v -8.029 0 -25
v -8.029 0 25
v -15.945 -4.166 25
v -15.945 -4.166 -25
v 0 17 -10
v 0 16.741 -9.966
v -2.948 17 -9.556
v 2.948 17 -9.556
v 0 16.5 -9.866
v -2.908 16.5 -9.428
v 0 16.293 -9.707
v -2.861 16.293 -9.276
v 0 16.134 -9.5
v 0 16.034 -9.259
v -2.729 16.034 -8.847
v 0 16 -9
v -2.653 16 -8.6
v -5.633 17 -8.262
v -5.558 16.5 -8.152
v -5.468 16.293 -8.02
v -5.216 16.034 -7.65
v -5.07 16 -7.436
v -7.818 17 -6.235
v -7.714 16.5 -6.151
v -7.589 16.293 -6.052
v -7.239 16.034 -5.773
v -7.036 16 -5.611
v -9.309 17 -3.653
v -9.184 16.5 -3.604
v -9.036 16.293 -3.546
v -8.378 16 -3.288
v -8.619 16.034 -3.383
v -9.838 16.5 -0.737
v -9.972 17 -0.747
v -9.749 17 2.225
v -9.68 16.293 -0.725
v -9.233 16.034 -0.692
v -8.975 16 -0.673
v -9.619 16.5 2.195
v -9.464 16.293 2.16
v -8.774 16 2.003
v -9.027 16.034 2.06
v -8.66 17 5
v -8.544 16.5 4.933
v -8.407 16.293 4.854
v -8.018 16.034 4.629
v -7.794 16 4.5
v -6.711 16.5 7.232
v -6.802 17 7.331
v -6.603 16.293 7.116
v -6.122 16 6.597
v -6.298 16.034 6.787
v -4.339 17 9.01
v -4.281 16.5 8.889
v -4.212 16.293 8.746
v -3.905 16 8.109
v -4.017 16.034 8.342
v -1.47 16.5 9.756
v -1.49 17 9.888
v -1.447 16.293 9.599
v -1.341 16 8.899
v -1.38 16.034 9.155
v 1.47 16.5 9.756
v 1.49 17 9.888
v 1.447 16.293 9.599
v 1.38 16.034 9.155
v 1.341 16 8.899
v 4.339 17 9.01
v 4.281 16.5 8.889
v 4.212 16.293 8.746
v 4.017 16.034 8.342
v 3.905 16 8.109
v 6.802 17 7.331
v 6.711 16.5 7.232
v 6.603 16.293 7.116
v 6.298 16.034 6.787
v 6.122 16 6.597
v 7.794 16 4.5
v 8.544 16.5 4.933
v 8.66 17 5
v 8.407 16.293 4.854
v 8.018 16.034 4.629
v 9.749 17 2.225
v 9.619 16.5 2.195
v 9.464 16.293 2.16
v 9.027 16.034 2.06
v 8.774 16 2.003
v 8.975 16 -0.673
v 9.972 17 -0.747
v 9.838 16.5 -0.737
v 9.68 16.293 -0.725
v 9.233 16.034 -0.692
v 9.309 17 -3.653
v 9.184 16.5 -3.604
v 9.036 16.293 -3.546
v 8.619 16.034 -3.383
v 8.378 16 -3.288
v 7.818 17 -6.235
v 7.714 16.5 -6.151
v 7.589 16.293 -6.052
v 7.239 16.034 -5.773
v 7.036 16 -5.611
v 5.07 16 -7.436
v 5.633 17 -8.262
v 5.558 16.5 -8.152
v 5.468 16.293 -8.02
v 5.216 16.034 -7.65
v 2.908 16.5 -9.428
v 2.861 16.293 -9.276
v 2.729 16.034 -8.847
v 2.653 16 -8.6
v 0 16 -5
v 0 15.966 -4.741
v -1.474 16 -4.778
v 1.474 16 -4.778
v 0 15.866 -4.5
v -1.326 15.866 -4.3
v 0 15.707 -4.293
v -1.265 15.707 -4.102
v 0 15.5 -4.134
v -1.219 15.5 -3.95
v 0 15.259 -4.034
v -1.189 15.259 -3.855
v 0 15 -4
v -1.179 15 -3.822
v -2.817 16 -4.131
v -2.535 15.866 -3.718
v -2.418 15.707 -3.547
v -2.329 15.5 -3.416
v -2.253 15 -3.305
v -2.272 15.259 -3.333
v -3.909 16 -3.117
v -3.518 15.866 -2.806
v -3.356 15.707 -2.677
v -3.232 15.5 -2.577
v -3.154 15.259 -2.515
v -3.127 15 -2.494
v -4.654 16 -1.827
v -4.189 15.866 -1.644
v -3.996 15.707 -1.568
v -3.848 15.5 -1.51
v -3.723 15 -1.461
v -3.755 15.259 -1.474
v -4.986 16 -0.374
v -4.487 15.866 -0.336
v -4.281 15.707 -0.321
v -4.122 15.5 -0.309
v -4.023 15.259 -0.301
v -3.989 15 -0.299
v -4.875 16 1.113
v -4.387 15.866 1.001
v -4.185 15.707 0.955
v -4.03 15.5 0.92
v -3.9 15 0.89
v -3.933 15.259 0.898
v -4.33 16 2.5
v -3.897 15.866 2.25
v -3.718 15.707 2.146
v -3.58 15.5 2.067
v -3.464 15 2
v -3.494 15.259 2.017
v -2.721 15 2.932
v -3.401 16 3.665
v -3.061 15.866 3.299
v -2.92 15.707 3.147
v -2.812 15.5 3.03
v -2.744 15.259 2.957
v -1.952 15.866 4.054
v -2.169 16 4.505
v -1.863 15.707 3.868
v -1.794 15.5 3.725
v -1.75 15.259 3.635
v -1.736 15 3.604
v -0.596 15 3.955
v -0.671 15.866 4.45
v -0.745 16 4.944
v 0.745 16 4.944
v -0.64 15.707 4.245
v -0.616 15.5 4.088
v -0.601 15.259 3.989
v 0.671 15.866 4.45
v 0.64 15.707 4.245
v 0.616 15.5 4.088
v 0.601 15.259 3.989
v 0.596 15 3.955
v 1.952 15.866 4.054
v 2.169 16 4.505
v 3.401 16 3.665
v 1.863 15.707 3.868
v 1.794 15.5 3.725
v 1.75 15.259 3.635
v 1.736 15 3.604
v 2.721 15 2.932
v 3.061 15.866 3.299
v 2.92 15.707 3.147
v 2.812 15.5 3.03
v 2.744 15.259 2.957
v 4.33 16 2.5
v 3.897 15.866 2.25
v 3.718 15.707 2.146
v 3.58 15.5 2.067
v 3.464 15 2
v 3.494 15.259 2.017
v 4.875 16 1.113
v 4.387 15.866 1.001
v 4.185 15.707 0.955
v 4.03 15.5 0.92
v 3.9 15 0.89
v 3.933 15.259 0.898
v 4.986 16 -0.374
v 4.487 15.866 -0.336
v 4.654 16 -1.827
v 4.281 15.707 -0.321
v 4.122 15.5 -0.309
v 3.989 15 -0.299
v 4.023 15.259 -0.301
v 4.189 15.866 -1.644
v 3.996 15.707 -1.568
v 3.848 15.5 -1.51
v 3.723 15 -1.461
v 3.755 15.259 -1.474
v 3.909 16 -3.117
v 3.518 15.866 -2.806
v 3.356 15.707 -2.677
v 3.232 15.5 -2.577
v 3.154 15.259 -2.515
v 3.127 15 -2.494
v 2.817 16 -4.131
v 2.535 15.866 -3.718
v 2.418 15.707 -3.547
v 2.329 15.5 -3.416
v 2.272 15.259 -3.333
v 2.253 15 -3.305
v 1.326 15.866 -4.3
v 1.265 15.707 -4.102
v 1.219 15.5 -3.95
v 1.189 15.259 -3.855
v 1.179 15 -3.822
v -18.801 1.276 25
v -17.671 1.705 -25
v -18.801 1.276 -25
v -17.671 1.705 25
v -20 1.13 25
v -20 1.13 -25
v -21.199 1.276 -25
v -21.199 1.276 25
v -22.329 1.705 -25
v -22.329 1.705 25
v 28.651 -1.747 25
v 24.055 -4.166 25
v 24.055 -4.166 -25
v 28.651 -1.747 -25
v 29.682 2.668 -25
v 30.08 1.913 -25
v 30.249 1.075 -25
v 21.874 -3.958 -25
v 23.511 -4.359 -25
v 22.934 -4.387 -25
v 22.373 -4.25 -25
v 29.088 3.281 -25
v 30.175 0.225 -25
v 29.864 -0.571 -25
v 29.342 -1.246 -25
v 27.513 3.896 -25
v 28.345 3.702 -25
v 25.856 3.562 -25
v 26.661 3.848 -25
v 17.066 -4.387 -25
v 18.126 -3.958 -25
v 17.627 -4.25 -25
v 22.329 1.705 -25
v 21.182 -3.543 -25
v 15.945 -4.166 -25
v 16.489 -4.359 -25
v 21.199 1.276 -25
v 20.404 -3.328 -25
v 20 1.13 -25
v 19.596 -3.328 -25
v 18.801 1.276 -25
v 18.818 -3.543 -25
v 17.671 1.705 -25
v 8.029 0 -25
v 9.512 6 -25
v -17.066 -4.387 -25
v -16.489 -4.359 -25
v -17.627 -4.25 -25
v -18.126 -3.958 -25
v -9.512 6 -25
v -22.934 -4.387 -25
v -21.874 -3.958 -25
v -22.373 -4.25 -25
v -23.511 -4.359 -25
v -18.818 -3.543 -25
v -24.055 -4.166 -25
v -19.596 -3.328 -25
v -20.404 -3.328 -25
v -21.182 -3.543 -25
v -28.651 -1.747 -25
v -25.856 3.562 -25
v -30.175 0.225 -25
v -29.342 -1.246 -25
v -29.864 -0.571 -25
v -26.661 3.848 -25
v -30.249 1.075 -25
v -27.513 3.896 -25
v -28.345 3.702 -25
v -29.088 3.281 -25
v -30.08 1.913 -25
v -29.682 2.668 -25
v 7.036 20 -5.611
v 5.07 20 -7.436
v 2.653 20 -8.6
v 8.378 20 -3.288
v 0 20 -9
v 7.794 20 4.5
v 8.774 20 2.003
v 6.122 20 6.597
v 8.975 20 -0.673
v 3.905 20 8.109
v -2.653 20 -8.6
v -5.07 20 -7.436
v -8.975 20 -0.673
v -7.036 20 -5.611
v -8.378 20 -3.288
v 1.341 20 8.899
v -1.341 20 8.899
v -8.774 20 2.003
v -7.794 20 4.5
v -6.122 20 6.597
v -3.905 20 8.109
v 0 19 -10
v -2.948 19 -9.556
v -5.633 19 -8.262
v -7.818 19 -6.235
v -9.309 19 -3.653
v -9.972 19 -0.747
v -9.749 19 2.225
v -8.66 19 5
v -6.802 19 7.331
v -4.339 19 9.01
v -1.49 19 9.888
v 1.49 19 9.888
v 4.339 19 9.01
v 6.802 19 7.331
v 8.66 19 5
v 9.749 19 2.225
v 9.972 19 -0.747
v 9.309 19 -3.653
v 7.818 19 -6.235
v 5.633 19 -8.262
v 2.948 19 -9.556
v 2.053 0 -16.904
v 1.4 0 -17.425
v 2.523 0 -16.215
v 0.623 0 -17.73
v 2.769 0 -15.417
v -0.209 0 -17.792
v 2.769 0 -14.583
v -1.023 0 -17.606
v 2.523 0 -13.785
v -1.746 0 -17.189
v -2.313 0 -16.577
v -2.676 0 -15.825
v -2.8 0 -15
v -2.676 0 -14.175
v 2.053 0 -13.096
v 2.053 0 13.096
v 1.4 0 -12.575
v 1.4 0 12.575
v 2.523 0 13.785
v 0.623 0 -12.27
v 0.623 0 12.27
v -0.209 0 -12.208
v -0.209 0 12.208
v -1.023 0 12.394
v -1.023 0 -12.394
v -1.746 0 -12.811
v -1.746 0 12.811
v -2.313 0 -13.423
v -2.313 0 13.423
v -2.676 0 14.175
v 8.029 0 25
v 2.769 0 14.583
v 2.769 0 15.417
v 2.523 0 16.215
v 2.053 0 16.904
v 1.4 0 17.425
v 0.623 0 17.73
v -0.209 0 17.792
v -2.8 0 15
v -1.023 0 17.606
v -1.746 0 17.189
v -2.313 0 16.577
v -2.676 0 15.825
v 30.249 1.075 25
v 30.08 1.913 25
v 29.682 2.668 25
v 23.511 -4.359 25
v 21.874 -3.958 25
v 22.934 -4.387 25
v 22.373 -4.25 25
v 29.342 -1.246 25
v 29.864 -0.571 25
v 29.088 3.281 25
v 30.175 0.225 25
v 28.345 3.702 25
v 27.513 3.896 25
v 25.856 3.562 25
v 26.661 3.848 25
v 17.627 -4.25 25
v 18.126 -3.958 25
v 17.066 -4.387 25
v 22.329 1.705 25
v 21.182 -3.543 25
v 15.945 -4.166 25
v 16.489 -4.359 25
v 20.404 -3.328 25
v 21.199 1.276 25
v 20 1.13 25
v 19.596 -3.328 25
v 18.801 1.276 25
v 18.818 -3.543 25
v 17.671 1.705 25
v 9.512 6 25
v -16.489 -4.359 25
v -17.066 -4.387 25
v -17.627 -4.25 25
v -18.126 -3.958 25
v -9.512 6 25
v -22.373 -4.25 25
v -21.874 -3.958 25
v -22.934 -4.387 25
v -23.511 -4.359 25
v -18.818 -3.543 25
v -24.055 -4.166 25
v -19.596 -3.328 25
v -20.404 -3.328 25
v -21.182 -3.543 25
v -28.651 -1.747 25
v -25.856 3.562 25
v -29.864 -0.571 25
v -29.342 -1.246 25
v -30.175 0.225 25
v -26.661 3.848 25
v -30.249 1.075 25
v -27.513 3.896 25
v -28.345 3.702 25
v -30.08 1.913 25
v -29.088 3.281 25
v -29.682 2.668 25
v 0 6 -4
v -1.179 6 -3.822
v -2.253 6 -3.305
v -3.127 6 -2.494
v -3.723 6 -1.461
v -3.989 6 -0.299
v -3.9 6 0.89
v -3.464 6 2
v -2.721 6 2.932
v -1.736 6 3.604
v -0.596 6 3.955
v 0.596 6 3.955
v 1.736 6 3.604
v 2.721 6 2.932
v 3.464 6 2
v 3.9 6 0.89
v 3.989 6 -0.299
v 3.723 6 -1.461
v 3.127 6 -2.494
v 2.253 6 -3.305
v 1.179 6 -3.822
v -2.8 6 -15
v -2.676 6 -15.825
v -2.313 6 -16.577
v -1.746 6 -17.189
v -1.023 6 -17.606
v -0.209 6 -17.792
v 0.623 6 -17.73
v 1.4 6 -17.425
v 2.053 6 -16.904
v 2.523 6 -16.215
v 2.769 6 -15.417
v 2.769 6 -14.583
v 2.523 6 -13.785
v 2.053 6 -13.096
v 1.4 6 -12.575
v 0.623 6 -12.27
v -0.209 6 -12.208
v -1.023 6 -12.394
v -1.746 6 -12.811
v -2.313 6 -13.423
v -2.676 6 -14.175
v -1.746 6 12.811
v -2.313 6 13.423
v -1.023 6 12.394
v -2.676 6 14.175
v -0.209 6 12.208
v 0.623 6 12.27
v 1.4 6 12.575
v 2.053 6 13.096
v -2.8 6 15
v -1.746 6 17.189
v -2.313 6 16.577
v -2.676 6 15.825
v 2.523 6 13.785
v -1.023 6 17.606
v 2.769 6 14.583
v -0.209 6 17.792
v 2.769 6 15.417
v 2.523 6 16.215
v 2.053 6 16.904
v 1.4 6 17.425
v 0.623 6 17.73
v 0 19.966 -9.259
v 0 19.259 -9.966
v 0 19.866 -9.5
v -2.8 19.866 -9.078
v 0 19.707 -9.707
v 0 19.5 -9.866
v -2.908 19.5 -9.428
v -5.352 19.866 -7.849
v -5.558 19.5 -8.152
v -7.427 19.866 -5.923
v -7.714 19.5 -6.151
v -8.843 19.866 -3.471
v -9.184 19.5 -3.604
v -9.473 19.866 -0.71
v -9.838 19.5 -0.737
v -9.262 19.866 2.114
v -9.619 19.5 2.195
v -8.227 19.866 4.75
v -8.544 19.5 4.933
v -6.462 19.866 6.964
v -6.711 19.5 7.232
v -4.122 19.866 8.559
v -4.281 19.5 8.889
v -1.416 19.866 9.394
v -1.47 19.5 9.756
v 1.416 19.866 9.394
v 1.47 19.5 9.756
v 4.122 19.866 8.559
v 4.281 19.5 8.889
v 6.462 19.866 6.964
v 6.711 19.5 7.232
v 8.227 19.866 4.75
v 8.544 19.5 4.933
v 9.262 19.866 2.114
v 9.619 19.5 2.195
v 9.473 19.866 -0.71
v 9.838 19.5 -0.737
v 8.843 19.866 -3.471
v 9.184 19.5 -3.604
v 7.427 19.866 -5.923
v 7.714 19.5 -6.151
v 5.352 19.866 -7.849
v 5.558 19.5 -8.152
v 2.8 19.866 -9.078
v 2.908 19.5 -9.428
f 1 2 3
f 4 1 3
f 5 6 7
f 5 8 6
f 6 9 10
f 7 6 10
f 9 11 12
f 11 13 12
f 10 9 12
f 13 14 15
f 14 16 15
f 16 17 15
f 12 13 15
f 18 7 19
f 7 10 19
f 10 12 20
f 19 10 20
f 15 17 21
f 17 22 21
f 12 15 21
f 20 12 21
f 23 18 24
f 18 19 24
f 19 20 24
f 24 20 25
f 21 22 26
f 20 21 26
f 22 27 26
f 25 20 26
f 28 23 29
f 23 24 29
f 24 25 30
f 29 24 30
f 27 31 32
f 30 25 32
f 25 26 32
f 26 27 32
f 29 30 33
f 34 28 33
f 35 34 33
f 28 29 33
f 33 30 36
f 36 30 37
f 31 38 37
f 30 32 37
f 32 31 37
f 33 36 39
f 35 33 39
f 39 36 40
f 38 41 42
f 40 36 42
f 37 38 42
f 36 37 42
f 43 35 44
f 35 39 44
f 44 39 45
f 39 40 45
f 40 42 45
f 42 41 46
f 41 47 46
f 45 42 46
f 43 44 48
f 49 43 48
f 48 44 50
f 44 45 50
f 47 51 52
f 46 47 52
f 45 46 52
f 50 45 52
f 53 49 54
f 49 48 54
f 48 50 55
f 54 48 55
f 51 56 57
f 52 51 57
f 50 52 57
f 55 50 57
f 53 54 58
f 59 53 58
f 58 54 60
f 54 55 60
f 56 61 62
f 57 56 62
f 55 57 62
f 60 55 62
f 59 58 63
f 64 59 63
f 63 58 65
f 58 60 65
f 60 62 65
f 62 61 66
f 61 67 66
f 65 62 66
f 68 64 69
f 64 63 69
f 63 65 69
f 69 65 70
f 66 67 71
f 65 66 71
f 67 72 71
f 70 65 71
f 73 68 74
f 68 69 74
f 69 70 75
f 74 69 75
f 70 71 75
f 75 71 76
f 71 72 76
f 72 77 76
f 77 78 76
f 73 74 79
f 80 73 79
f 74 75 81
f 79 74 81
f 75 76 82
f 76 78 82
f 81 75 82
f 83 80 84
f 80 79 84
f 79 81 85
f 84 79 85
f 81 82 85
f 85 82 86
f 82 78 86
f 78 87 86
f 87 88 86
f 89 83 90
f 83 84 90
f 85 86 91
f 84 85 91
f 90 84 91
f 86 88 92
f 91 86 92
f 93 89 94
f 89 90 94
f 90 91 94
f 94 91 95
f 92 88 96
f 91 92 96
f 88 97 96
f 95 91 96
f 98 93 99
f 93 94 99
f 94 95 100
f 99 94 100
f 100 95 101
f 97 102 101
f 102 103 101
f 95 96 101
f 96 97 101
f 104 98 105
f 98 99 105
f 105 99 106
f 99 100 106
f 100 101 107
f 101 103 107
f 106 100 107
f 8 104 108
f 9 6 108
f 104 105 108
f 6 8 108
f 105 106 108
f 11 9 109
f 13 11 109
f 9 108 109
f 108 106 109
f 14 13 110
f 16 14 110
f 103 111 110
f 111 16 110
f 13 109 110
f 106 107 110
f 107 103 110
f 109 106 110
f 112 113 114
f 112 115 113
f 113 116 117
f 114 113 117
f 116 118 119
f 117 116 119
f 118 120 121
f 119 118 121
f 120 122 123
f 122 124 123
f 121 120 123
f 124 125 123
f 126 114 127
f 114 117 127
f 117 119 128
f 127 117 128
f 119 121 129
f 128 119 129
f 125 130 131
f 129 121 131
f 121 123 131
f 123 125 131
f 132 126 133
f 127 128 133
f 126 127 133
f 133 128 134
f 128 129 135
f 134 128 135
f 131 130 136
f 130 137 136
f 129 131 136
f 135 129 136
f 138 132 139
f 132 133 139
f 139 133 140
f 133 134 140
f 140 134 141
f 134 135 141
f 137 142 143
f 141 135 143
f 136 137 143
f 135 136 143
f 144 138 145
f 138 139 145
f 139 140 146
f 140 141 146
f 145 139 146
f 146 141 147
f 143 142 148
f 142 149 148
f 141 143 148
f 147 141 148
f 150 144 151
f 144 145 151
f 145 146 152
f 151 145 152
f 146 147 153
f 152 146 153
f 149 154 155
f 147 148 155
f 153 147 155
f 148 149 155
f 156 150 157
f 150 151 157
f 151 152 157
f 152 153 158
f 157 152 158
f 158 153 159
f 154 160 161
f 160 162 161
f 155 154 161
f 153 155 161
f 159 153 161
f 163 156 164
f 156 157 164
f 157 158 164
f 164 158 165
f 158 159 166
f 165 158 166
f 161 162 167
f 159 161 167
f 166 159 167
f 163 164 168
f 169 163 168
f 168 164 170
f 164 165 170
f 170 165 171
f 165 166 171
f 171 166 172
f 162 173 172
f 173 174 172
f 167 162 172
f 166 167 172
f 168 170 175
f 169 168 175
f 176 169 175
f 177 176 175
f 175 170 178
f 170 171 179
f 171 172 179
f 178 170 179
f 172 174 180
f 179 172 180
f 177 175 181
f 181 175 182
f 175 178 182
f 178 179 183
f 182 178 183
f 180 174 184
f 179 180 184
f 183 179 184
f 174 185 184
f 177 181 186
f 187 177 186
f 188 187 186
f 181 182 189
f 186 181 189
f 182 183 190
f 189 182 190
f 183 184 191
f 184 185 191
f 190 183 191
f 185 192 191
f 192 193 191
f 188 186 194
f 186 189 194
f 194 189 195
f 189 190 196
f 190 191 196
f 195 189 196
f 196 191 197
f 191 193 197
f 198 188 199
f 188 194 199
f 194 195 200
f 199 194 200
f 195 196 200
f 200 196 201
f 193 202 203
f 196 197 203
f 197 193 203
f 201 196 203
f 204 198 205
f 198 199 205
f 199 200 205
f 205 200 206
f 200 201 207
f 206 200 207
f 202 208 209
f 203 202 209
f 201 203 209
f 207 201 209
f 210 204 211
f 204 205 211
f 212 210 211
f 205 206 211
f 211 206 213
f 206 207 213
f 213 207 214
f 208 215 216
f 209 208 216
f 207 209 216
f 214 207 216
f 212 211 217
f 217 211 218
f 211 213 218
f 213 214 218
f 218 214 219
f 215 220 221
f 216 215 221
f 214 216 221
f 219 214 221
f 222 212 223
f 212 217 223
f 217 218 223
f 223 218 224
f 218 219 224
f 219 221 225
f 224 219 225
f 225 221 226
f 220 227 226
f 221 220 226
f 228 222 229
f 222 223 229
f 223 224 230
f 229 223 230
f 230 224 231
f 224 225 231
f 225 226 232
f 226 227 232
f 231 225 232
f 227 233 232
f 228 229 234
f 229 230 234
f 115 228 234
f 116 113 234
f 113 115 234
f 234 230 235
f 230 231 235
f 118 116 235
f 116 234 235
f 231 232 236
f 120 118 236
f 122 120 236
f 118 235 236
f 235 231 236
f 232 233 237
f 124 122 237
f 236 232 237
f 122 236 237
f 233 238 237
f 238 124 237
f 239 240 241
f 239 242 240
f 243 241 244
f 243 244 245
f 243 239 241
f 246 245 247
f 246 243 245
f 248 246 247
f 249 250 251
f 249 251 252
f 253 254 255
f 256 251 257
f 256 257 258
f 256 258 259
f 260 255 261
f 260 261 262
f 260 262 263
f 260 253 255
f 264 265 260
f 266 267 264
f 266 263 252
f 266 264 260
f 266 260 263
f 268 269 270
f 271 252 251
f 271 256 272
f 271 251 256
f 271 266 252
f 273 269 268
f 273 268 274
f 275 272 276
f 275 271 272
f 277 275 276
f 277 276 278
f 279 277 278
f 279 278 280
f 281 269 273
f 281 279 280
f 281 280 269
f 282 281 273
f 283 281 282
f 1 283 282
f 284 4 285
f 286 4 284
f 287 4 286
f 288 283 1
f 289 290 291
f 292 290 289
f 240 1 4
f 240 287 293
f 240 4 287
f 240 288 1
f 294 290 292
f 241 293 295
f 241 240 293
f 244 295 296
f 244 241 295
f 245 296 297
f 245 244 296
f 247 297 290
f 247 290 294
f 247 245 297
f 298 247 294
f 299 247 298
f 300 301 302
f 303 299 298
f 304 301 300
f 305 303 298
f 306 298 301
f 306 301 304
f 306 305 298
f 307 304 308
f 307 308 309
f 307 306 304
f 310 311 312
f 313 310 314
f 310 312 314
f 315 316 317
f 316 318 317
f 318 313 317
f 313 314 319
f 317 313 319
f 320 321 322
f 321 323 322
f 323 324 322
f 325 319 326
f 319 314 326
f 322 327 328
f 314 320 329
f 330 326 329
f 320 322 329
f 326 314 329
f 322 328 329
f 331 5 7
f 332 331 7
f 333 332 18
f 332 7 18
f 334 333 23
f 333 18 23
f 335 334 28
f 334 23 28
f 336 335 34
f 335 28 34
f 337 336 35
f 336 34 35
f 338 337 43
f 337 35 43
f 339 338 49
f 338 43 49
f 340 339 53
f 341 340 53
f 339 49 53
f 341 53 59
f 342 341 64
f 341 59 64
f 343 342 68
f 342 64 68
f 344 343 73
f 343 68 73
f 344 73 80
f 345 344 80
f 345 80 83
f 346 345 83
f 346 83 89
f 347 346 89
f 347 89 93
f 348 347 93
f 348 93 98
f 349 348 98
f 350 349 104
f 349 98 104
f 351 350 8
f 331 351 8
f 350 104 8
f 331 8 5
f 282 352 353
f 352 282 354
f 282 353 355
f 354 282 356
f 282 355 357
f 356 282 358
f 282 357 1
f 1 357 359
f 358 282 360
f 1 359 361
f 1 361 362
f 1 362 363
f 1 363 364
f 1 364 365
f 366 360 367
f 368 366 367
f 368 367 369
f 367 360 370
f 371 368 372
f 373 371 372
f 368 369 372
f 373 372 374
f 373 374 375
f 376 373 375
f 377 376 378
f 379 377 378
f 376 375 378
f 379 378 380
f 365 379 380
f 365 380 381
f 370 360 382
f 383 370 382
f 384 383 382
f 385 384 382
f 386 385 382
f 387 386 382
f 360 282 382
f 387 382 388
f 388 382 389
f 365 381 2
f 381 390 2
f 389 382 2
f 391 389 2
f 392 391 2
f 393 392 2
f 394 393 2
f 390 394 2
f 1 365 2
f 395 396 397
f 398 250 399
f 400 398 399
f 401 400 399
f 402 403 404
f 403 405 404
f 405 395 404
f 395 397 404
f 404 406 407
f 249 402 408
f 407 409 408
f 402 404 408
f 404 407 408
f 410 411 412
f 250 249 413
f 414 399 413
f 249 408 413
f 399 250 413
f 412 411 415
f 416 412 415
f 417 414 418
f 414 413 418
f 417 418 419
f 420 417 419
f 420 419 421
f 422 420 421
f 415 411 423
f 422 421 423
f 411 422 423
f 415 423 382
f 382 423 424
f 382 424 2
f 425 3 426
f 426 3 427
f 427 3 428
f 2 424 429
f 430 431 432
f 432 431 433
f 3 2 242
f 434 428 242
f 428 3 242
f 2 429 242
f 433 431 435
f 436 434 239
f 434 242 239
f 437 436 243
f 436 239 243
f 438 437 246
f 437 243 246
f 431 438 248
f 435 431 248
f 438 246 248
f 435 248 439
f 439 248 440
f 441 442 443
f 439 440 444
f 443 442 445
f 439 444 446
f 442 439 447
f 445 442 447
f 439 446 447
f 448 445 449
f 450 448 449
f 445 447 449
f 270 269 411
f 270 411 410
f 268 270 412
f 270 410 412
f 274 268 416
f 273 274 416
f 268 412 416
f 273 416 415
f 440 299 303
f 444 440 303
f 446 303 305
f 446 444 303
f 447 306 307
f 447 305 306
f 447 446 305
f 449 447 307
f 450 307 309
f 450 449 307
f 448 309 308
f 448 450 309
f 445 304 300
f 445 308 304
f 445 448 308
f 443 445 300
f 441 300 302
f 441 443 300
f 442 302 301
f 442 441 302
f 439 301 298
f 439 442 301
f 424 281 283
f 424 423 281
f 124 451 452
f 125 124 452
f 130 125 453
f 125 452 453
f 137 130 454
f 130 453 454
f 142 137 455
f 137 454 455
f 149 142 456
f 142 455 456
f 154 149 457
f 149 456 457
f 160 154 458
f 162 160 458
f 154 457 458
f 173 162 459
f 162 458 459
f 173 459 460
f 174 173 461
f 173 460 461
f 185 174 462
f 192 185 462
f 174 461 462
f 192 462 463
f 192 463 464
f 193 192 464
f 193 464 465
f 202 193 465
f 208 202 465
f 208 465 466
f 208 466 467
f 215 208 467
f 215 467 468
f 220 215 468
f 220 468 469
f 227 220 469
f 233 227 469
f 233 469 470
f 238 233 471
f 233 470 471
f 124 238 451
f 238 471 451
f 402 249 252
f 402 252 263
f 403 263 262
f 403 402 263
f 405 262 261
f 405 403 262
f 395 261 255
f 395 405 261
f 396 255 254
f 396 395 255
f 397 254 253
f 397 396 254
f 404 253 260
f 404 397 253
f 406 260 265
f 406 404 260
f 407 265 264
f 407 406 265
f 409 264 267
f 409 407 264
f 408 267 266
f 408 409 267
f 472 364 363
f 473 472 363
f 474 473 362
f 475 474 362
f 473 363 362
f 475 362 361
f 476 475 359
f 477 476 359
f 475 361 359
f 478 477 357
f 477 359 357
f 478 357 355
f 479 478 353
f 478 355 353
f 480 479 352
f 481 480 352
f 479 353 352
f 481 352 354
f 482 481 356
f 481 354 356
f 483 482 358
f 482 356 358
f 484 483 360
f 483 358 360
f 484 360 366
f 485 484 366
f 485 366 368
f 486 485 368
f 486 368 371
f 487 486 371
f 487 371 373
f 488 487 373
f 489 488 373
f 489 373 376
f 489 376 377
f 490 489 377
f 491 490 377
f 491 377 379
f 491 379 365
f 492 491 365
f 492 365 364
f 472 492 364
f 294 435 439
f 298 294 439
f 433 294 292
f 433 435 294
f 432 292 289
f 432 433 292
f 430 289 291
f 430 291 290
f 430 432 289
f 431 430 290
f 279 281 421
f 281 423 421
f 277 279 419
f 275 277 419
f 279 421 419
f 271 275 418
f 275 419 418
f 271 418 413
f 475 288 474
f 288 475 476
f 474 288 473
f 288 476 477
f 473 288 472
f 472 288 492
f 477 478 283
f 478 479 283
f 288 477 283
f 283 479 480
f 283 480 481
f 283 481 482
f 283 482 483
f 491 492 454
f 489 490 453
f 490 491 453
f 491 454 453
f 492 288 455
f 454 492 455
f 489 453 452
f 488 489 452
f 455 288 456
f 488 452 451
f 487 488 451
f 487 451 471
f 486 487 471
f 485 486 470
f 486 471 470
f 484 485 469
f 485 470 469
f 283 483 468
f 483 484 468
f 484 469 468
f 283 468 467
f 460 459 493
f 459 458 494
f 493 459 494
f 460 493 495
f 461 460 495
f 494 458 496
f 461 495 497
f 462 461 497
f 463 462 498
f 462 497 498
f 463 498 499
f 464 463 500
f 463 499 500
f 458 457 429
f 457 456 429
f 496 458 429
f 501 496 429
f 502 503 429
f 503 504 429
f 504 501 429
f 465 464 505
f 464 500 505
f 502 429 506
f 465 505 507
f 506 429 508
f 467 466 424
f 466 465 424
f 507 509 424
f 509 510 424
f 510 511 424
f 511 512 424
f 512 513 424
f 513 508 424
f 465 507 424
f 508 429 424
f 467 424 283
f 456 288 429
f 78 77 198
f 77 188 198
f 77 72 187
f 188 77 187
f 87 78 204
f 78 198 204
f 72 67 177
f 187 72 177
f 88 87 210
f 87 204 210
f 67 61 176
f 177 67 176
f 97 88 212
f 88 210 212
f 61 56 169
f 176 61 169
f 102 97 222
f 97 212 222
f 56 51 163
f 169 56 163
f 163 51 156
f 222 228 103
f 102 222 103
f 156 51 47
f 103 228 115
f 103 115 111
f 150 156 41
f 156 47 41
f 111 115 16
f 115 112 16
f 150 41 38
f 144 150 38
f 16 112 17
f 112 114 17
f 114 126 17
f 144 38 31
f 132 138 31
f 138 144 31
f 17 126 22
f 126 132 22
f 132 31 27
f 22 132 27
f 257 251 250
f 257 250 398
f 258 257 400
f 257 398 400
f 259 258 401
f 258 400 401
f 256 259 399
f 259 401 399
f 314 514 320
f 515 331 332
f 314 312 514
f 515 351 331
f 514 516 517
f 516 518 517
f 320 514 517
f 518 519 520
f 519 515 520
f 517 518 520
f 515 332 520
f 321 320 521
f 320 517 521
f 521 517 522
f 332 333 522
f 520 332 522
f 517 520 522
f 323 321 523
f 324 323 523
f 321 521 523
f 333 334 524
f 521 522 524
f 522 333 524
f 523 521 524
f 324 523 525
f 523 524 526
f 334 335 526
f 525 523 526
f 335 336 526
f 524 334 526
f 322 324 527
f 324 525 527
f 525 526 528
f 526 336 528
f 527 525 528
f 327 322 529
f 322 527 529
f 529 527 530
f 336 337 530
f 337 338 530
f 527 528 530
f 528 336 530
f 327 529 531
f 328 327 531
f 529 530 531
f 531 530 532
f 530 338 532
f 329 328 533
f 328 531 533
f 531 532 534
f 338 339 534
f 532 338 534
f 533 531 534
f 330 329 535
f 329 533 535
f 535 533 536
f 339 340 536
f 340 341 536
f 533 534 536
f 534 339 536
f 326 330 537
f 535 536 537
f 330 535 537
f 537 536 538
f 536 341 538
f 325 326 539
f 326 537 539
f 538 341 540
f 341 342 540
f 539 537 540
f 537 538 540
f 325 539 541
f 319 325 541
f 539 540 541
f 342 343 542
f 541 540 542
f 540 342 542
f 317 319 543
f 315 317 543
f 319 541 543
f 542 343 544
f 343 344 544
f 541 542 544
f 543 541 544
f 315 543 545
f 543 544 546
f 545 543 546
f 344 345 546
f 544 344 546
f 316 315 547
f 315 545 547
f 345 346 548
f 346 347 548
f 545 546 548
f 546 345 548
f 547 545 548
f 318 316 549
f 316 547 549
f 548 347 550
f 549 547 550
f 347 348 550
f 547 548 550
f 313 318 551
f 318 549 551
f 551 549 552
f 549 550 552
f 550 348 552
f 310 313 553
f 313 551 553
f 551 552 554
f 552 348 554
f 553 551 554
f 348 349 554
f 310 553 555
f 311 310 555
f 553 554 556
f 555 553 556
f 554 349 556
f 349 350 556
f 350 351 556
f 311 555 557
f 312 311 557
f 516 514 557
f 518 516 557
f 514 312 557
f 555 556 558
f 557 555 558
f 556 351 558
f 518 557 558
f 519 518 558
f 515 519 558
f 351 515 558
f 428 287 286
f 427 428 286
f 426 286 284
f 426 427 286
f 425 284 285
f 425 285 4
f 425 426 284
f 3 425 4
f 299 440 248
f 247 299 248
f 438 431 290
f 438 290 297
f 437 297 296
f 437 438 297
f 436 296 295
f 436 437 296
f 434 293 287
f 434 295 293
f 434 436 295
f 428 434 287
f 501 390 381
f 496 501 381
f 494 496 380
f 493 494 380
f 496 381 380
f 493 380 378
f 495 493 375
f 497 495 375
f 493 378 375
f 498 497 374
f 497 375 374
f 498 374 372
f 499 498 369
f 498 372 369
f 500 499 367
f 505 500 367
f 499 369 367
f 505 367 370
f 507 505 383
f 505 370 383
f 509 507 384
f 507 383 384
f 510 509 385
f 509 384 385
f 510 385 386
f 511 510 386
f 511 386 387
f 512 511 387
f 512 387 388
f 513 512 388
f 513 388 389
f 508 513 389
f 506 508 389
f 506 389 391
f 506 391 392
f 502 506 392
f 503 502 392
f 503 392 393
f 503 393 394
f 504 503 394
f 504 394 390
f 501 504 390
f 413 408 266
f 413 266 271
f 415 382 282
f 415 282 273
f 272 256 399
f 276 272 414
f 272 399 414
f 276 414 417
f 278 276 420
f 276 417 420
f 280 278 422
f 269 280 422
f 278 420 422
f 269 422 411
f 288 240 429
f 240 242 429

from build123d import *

# Parameters (mm, degrees)
EXTRUIR_L_MINA1_DEPTH           = 25
REDONDEO1_R                     = 5
CROQUIS2_R                      = 3
CORTAR_EXTRUIR1_DEPTH           = 41.555257948
REDONDEO2_RADIUS                = 3
REDONDEO2_LENGTH                = 50
REDONDEO3_R                     = 2
REDONDEO1_OF_SIMETR_A1_R        = 5
REDONDEO2_OF_SIMETR_A1_2_RADIUS = 3
REDONDEO2_OF_SIMETR_A1_2_LENGTH = 50
REDONDEO3_OF_SIMETR_A1_R        = 2
TALADRO2_D                      = 5.6
REDONDEO4_R                     = 1


with BuildPart() as part:
    # Croquis1 → Extruir-Lámina1 (new, symmetric)
    with BuildSketch(Plane.XY):
        Polygon((0, 0), (8.029231721, 0), (20, -6.300526927), (31.305467696, -0.350165014), (28.510946527, 4.959321914), (20, 0.479789229), (9.511803576, 6), (0, 6), align=None)
    extruir_l_mina1 = extrude(amount=EXTRUIR_L_MINA1_DEPTH, both=True)

    # Redondeo1
    redondeo1_edges = [part.edges().sort_by_distance(p)[0] for p in [
        (20, 0.479789229, 0),
    ]]
    fillet(redondeo1_edges, radius=REDONDEO1_R)

    # Croquis2 → Cortar-Extruir1 (cut, symmetric)
    with BuildSketch(Plane.XY):
        with Locations((20, -6.300526927)):
            Circle(CROQUIS2_R)
    cortar_extruir1 = extrude(amount=CORTAR_EXTRUIR1_DEPTH, both=True, mode=Mode.SUBTRACT)

    # Redondeo2: full round fillet: the end face becomes a half cylinder, R = half its width
    redondeo2_face = Plane((29.908207112, 2.30457845, 0), x_dir=(0, 0, 1), z_dir=(0.884914487987, 0.465753528113, 0))  # on the end face: x along it, z out of the body
    redondeo2_slab = redondeo2_face.offset(-REDONDEO2_RADIUS / 2) * Box(REDONDEO2_LENGTH, 2 * REDONDEO2_RADIUS, REDONDEO2_RADIUS, mode=Mode.PRIVATE)  # the body's end, R deep
    redondeo2_round = Plane((27.253463648, 0.907317866, 0), x_dir=(0.884914487987, 0.465753528113, 0), z_dir=(0, 0, 1)) * Cylinder(REDONDEO2_RADIUS, REDONDEO2_LENGTH, mode=Mode.PRIVATE)  # its axis R under the face
    add(redondeo2_slab - redondeo2_round, mode=Mode.SUBTRACT)

    # Redondeo3
    redondeo3_edges = [part.edges().sort_by_distance(p)[0] for p in [
        (22.654743464, -4.903266343, 0),
        (17.345256536, -4.903266343, 0),
    ]]
    fillet(redondeo3_edges, radius=REDONDEO3_R)

    # Simetría1: Extruir-Lámina1, Cortar-Extruir1 across plane
    add(extruir_l_mina1.mirror(Plane(origin=(0, 0, 0), x_dir=(0, 0, 1), z_dir=(1, 0, 0))))
    add(cortar_extruir1.mirror(Plane(origin=(0, 0, 0), x_dir=(0, 0, 1), z_dir=(1, 0, 0))), mode=Mode.SUBTRACT)

    # Redondeo1 of Simetría1
    redondeo1_of_simetr_a1_edges = [part.edges().sort_by_distance(p)[0] for p in [
        (-20, 0.479789229, 0),
    ]]
    fillet(redondeo1_of_simetr_a1_edges, radius=REDONDEO1_OF_SIMETR_A1_R)

    # Redondeo2 of Simetr_a1 2: full round fillet: the end face becomes a half cylinder, R = half its width
    redondeo2_of_simetr_a1_2_face = Plane((-29.908207112, 2.30457845, 0), x_dir=(0, 0, 1), z_dir=(-0.884914487987, 0.465753528113, 0))  # on the end face: x along it, z out of the body
    redondeo2_of_simetr_a1_2_slab = redondeo2_of_simetr_a1_2_face.offset(-REDONDEO2_OF_SIMETR_A1_2_RADIUS / 2) * Box(REDONDEO2_OF_SIMETR_A1_2_LENGTH, 2 * REDONDEO2_OF_SIMETR_A1_2_RADIUS, REDONDEO2_OF_SIMETR_A1_2_RADIUS, mode=Mode.PRIVATE)  # the body's end, R deep
    redondeo2_of_simetr_a1_2_round = Plane((-27.253463648, 0.907317866, 0), x_dir=(-0.884914487987, 0.465753528113, 0), z_dir=(0, 0, 1)) * Cylinder(REDONDEO2_OF_SIMETR_A1_2_RADIUS, REDONDEO2_OF_SIMETR_A1_2_LENGTH, mode=Mode.PRIVATE)  # its axis R under the face
    add(redondeo2_of_simetr_a1_2_slab - redondeo2_of_simetr_a1_2_round, mode=Mode.SUBTRACT)

    # Redondeo3 of Simetría1
    redondeo3_of_simetr_a1_edges = [part.edges().sort_by_distance(p)[0] for p in [
        (-22.654743464, -4.903266343, 0),
        (-17.345256536, -4.903266343, 0),
    ]]
    fillet(redondeo3_of_simetr_a1_edges, radius=REDONDEO3_OF_SIMETR_A1_R)

    # Taladro2 (through all)
    with Locations(Plane(origin=(0, 6, 0), x_dir=(1, 0, 0), z_dir=(0, 1, 0))):
        with Locations((0, 15), (0, -15)):
            Hole(TALADRO2_D / 2)

    # Croquis5 → Revolución1 (revolve)
    with BuildSketch(Plane.XY, mode=Mode.PRIVATE) as revoluci_n1_sk:
        Polygon((0, 0), (0, 20), (10, 20), (10, 16), (4, 16), (4, 0), align=None)
    revolve(revoluci_n1_sk.sketch.rotate(Axis((0, 0, 0), (0, 1, 0)), 90), axis=Axis((0, 0, 0), (0, 1, 0)))

    # Redondeo4
    redondeo4_edges = [part.edges().sort_by_distance(p)[0] for p in [
        (0, 20, 10),
        (0, 16, 10),
        (0, 16, 4),
    ]]
    fillet(redondeo4_edges, radius=REDONDEO4_R)


solid = part.part
